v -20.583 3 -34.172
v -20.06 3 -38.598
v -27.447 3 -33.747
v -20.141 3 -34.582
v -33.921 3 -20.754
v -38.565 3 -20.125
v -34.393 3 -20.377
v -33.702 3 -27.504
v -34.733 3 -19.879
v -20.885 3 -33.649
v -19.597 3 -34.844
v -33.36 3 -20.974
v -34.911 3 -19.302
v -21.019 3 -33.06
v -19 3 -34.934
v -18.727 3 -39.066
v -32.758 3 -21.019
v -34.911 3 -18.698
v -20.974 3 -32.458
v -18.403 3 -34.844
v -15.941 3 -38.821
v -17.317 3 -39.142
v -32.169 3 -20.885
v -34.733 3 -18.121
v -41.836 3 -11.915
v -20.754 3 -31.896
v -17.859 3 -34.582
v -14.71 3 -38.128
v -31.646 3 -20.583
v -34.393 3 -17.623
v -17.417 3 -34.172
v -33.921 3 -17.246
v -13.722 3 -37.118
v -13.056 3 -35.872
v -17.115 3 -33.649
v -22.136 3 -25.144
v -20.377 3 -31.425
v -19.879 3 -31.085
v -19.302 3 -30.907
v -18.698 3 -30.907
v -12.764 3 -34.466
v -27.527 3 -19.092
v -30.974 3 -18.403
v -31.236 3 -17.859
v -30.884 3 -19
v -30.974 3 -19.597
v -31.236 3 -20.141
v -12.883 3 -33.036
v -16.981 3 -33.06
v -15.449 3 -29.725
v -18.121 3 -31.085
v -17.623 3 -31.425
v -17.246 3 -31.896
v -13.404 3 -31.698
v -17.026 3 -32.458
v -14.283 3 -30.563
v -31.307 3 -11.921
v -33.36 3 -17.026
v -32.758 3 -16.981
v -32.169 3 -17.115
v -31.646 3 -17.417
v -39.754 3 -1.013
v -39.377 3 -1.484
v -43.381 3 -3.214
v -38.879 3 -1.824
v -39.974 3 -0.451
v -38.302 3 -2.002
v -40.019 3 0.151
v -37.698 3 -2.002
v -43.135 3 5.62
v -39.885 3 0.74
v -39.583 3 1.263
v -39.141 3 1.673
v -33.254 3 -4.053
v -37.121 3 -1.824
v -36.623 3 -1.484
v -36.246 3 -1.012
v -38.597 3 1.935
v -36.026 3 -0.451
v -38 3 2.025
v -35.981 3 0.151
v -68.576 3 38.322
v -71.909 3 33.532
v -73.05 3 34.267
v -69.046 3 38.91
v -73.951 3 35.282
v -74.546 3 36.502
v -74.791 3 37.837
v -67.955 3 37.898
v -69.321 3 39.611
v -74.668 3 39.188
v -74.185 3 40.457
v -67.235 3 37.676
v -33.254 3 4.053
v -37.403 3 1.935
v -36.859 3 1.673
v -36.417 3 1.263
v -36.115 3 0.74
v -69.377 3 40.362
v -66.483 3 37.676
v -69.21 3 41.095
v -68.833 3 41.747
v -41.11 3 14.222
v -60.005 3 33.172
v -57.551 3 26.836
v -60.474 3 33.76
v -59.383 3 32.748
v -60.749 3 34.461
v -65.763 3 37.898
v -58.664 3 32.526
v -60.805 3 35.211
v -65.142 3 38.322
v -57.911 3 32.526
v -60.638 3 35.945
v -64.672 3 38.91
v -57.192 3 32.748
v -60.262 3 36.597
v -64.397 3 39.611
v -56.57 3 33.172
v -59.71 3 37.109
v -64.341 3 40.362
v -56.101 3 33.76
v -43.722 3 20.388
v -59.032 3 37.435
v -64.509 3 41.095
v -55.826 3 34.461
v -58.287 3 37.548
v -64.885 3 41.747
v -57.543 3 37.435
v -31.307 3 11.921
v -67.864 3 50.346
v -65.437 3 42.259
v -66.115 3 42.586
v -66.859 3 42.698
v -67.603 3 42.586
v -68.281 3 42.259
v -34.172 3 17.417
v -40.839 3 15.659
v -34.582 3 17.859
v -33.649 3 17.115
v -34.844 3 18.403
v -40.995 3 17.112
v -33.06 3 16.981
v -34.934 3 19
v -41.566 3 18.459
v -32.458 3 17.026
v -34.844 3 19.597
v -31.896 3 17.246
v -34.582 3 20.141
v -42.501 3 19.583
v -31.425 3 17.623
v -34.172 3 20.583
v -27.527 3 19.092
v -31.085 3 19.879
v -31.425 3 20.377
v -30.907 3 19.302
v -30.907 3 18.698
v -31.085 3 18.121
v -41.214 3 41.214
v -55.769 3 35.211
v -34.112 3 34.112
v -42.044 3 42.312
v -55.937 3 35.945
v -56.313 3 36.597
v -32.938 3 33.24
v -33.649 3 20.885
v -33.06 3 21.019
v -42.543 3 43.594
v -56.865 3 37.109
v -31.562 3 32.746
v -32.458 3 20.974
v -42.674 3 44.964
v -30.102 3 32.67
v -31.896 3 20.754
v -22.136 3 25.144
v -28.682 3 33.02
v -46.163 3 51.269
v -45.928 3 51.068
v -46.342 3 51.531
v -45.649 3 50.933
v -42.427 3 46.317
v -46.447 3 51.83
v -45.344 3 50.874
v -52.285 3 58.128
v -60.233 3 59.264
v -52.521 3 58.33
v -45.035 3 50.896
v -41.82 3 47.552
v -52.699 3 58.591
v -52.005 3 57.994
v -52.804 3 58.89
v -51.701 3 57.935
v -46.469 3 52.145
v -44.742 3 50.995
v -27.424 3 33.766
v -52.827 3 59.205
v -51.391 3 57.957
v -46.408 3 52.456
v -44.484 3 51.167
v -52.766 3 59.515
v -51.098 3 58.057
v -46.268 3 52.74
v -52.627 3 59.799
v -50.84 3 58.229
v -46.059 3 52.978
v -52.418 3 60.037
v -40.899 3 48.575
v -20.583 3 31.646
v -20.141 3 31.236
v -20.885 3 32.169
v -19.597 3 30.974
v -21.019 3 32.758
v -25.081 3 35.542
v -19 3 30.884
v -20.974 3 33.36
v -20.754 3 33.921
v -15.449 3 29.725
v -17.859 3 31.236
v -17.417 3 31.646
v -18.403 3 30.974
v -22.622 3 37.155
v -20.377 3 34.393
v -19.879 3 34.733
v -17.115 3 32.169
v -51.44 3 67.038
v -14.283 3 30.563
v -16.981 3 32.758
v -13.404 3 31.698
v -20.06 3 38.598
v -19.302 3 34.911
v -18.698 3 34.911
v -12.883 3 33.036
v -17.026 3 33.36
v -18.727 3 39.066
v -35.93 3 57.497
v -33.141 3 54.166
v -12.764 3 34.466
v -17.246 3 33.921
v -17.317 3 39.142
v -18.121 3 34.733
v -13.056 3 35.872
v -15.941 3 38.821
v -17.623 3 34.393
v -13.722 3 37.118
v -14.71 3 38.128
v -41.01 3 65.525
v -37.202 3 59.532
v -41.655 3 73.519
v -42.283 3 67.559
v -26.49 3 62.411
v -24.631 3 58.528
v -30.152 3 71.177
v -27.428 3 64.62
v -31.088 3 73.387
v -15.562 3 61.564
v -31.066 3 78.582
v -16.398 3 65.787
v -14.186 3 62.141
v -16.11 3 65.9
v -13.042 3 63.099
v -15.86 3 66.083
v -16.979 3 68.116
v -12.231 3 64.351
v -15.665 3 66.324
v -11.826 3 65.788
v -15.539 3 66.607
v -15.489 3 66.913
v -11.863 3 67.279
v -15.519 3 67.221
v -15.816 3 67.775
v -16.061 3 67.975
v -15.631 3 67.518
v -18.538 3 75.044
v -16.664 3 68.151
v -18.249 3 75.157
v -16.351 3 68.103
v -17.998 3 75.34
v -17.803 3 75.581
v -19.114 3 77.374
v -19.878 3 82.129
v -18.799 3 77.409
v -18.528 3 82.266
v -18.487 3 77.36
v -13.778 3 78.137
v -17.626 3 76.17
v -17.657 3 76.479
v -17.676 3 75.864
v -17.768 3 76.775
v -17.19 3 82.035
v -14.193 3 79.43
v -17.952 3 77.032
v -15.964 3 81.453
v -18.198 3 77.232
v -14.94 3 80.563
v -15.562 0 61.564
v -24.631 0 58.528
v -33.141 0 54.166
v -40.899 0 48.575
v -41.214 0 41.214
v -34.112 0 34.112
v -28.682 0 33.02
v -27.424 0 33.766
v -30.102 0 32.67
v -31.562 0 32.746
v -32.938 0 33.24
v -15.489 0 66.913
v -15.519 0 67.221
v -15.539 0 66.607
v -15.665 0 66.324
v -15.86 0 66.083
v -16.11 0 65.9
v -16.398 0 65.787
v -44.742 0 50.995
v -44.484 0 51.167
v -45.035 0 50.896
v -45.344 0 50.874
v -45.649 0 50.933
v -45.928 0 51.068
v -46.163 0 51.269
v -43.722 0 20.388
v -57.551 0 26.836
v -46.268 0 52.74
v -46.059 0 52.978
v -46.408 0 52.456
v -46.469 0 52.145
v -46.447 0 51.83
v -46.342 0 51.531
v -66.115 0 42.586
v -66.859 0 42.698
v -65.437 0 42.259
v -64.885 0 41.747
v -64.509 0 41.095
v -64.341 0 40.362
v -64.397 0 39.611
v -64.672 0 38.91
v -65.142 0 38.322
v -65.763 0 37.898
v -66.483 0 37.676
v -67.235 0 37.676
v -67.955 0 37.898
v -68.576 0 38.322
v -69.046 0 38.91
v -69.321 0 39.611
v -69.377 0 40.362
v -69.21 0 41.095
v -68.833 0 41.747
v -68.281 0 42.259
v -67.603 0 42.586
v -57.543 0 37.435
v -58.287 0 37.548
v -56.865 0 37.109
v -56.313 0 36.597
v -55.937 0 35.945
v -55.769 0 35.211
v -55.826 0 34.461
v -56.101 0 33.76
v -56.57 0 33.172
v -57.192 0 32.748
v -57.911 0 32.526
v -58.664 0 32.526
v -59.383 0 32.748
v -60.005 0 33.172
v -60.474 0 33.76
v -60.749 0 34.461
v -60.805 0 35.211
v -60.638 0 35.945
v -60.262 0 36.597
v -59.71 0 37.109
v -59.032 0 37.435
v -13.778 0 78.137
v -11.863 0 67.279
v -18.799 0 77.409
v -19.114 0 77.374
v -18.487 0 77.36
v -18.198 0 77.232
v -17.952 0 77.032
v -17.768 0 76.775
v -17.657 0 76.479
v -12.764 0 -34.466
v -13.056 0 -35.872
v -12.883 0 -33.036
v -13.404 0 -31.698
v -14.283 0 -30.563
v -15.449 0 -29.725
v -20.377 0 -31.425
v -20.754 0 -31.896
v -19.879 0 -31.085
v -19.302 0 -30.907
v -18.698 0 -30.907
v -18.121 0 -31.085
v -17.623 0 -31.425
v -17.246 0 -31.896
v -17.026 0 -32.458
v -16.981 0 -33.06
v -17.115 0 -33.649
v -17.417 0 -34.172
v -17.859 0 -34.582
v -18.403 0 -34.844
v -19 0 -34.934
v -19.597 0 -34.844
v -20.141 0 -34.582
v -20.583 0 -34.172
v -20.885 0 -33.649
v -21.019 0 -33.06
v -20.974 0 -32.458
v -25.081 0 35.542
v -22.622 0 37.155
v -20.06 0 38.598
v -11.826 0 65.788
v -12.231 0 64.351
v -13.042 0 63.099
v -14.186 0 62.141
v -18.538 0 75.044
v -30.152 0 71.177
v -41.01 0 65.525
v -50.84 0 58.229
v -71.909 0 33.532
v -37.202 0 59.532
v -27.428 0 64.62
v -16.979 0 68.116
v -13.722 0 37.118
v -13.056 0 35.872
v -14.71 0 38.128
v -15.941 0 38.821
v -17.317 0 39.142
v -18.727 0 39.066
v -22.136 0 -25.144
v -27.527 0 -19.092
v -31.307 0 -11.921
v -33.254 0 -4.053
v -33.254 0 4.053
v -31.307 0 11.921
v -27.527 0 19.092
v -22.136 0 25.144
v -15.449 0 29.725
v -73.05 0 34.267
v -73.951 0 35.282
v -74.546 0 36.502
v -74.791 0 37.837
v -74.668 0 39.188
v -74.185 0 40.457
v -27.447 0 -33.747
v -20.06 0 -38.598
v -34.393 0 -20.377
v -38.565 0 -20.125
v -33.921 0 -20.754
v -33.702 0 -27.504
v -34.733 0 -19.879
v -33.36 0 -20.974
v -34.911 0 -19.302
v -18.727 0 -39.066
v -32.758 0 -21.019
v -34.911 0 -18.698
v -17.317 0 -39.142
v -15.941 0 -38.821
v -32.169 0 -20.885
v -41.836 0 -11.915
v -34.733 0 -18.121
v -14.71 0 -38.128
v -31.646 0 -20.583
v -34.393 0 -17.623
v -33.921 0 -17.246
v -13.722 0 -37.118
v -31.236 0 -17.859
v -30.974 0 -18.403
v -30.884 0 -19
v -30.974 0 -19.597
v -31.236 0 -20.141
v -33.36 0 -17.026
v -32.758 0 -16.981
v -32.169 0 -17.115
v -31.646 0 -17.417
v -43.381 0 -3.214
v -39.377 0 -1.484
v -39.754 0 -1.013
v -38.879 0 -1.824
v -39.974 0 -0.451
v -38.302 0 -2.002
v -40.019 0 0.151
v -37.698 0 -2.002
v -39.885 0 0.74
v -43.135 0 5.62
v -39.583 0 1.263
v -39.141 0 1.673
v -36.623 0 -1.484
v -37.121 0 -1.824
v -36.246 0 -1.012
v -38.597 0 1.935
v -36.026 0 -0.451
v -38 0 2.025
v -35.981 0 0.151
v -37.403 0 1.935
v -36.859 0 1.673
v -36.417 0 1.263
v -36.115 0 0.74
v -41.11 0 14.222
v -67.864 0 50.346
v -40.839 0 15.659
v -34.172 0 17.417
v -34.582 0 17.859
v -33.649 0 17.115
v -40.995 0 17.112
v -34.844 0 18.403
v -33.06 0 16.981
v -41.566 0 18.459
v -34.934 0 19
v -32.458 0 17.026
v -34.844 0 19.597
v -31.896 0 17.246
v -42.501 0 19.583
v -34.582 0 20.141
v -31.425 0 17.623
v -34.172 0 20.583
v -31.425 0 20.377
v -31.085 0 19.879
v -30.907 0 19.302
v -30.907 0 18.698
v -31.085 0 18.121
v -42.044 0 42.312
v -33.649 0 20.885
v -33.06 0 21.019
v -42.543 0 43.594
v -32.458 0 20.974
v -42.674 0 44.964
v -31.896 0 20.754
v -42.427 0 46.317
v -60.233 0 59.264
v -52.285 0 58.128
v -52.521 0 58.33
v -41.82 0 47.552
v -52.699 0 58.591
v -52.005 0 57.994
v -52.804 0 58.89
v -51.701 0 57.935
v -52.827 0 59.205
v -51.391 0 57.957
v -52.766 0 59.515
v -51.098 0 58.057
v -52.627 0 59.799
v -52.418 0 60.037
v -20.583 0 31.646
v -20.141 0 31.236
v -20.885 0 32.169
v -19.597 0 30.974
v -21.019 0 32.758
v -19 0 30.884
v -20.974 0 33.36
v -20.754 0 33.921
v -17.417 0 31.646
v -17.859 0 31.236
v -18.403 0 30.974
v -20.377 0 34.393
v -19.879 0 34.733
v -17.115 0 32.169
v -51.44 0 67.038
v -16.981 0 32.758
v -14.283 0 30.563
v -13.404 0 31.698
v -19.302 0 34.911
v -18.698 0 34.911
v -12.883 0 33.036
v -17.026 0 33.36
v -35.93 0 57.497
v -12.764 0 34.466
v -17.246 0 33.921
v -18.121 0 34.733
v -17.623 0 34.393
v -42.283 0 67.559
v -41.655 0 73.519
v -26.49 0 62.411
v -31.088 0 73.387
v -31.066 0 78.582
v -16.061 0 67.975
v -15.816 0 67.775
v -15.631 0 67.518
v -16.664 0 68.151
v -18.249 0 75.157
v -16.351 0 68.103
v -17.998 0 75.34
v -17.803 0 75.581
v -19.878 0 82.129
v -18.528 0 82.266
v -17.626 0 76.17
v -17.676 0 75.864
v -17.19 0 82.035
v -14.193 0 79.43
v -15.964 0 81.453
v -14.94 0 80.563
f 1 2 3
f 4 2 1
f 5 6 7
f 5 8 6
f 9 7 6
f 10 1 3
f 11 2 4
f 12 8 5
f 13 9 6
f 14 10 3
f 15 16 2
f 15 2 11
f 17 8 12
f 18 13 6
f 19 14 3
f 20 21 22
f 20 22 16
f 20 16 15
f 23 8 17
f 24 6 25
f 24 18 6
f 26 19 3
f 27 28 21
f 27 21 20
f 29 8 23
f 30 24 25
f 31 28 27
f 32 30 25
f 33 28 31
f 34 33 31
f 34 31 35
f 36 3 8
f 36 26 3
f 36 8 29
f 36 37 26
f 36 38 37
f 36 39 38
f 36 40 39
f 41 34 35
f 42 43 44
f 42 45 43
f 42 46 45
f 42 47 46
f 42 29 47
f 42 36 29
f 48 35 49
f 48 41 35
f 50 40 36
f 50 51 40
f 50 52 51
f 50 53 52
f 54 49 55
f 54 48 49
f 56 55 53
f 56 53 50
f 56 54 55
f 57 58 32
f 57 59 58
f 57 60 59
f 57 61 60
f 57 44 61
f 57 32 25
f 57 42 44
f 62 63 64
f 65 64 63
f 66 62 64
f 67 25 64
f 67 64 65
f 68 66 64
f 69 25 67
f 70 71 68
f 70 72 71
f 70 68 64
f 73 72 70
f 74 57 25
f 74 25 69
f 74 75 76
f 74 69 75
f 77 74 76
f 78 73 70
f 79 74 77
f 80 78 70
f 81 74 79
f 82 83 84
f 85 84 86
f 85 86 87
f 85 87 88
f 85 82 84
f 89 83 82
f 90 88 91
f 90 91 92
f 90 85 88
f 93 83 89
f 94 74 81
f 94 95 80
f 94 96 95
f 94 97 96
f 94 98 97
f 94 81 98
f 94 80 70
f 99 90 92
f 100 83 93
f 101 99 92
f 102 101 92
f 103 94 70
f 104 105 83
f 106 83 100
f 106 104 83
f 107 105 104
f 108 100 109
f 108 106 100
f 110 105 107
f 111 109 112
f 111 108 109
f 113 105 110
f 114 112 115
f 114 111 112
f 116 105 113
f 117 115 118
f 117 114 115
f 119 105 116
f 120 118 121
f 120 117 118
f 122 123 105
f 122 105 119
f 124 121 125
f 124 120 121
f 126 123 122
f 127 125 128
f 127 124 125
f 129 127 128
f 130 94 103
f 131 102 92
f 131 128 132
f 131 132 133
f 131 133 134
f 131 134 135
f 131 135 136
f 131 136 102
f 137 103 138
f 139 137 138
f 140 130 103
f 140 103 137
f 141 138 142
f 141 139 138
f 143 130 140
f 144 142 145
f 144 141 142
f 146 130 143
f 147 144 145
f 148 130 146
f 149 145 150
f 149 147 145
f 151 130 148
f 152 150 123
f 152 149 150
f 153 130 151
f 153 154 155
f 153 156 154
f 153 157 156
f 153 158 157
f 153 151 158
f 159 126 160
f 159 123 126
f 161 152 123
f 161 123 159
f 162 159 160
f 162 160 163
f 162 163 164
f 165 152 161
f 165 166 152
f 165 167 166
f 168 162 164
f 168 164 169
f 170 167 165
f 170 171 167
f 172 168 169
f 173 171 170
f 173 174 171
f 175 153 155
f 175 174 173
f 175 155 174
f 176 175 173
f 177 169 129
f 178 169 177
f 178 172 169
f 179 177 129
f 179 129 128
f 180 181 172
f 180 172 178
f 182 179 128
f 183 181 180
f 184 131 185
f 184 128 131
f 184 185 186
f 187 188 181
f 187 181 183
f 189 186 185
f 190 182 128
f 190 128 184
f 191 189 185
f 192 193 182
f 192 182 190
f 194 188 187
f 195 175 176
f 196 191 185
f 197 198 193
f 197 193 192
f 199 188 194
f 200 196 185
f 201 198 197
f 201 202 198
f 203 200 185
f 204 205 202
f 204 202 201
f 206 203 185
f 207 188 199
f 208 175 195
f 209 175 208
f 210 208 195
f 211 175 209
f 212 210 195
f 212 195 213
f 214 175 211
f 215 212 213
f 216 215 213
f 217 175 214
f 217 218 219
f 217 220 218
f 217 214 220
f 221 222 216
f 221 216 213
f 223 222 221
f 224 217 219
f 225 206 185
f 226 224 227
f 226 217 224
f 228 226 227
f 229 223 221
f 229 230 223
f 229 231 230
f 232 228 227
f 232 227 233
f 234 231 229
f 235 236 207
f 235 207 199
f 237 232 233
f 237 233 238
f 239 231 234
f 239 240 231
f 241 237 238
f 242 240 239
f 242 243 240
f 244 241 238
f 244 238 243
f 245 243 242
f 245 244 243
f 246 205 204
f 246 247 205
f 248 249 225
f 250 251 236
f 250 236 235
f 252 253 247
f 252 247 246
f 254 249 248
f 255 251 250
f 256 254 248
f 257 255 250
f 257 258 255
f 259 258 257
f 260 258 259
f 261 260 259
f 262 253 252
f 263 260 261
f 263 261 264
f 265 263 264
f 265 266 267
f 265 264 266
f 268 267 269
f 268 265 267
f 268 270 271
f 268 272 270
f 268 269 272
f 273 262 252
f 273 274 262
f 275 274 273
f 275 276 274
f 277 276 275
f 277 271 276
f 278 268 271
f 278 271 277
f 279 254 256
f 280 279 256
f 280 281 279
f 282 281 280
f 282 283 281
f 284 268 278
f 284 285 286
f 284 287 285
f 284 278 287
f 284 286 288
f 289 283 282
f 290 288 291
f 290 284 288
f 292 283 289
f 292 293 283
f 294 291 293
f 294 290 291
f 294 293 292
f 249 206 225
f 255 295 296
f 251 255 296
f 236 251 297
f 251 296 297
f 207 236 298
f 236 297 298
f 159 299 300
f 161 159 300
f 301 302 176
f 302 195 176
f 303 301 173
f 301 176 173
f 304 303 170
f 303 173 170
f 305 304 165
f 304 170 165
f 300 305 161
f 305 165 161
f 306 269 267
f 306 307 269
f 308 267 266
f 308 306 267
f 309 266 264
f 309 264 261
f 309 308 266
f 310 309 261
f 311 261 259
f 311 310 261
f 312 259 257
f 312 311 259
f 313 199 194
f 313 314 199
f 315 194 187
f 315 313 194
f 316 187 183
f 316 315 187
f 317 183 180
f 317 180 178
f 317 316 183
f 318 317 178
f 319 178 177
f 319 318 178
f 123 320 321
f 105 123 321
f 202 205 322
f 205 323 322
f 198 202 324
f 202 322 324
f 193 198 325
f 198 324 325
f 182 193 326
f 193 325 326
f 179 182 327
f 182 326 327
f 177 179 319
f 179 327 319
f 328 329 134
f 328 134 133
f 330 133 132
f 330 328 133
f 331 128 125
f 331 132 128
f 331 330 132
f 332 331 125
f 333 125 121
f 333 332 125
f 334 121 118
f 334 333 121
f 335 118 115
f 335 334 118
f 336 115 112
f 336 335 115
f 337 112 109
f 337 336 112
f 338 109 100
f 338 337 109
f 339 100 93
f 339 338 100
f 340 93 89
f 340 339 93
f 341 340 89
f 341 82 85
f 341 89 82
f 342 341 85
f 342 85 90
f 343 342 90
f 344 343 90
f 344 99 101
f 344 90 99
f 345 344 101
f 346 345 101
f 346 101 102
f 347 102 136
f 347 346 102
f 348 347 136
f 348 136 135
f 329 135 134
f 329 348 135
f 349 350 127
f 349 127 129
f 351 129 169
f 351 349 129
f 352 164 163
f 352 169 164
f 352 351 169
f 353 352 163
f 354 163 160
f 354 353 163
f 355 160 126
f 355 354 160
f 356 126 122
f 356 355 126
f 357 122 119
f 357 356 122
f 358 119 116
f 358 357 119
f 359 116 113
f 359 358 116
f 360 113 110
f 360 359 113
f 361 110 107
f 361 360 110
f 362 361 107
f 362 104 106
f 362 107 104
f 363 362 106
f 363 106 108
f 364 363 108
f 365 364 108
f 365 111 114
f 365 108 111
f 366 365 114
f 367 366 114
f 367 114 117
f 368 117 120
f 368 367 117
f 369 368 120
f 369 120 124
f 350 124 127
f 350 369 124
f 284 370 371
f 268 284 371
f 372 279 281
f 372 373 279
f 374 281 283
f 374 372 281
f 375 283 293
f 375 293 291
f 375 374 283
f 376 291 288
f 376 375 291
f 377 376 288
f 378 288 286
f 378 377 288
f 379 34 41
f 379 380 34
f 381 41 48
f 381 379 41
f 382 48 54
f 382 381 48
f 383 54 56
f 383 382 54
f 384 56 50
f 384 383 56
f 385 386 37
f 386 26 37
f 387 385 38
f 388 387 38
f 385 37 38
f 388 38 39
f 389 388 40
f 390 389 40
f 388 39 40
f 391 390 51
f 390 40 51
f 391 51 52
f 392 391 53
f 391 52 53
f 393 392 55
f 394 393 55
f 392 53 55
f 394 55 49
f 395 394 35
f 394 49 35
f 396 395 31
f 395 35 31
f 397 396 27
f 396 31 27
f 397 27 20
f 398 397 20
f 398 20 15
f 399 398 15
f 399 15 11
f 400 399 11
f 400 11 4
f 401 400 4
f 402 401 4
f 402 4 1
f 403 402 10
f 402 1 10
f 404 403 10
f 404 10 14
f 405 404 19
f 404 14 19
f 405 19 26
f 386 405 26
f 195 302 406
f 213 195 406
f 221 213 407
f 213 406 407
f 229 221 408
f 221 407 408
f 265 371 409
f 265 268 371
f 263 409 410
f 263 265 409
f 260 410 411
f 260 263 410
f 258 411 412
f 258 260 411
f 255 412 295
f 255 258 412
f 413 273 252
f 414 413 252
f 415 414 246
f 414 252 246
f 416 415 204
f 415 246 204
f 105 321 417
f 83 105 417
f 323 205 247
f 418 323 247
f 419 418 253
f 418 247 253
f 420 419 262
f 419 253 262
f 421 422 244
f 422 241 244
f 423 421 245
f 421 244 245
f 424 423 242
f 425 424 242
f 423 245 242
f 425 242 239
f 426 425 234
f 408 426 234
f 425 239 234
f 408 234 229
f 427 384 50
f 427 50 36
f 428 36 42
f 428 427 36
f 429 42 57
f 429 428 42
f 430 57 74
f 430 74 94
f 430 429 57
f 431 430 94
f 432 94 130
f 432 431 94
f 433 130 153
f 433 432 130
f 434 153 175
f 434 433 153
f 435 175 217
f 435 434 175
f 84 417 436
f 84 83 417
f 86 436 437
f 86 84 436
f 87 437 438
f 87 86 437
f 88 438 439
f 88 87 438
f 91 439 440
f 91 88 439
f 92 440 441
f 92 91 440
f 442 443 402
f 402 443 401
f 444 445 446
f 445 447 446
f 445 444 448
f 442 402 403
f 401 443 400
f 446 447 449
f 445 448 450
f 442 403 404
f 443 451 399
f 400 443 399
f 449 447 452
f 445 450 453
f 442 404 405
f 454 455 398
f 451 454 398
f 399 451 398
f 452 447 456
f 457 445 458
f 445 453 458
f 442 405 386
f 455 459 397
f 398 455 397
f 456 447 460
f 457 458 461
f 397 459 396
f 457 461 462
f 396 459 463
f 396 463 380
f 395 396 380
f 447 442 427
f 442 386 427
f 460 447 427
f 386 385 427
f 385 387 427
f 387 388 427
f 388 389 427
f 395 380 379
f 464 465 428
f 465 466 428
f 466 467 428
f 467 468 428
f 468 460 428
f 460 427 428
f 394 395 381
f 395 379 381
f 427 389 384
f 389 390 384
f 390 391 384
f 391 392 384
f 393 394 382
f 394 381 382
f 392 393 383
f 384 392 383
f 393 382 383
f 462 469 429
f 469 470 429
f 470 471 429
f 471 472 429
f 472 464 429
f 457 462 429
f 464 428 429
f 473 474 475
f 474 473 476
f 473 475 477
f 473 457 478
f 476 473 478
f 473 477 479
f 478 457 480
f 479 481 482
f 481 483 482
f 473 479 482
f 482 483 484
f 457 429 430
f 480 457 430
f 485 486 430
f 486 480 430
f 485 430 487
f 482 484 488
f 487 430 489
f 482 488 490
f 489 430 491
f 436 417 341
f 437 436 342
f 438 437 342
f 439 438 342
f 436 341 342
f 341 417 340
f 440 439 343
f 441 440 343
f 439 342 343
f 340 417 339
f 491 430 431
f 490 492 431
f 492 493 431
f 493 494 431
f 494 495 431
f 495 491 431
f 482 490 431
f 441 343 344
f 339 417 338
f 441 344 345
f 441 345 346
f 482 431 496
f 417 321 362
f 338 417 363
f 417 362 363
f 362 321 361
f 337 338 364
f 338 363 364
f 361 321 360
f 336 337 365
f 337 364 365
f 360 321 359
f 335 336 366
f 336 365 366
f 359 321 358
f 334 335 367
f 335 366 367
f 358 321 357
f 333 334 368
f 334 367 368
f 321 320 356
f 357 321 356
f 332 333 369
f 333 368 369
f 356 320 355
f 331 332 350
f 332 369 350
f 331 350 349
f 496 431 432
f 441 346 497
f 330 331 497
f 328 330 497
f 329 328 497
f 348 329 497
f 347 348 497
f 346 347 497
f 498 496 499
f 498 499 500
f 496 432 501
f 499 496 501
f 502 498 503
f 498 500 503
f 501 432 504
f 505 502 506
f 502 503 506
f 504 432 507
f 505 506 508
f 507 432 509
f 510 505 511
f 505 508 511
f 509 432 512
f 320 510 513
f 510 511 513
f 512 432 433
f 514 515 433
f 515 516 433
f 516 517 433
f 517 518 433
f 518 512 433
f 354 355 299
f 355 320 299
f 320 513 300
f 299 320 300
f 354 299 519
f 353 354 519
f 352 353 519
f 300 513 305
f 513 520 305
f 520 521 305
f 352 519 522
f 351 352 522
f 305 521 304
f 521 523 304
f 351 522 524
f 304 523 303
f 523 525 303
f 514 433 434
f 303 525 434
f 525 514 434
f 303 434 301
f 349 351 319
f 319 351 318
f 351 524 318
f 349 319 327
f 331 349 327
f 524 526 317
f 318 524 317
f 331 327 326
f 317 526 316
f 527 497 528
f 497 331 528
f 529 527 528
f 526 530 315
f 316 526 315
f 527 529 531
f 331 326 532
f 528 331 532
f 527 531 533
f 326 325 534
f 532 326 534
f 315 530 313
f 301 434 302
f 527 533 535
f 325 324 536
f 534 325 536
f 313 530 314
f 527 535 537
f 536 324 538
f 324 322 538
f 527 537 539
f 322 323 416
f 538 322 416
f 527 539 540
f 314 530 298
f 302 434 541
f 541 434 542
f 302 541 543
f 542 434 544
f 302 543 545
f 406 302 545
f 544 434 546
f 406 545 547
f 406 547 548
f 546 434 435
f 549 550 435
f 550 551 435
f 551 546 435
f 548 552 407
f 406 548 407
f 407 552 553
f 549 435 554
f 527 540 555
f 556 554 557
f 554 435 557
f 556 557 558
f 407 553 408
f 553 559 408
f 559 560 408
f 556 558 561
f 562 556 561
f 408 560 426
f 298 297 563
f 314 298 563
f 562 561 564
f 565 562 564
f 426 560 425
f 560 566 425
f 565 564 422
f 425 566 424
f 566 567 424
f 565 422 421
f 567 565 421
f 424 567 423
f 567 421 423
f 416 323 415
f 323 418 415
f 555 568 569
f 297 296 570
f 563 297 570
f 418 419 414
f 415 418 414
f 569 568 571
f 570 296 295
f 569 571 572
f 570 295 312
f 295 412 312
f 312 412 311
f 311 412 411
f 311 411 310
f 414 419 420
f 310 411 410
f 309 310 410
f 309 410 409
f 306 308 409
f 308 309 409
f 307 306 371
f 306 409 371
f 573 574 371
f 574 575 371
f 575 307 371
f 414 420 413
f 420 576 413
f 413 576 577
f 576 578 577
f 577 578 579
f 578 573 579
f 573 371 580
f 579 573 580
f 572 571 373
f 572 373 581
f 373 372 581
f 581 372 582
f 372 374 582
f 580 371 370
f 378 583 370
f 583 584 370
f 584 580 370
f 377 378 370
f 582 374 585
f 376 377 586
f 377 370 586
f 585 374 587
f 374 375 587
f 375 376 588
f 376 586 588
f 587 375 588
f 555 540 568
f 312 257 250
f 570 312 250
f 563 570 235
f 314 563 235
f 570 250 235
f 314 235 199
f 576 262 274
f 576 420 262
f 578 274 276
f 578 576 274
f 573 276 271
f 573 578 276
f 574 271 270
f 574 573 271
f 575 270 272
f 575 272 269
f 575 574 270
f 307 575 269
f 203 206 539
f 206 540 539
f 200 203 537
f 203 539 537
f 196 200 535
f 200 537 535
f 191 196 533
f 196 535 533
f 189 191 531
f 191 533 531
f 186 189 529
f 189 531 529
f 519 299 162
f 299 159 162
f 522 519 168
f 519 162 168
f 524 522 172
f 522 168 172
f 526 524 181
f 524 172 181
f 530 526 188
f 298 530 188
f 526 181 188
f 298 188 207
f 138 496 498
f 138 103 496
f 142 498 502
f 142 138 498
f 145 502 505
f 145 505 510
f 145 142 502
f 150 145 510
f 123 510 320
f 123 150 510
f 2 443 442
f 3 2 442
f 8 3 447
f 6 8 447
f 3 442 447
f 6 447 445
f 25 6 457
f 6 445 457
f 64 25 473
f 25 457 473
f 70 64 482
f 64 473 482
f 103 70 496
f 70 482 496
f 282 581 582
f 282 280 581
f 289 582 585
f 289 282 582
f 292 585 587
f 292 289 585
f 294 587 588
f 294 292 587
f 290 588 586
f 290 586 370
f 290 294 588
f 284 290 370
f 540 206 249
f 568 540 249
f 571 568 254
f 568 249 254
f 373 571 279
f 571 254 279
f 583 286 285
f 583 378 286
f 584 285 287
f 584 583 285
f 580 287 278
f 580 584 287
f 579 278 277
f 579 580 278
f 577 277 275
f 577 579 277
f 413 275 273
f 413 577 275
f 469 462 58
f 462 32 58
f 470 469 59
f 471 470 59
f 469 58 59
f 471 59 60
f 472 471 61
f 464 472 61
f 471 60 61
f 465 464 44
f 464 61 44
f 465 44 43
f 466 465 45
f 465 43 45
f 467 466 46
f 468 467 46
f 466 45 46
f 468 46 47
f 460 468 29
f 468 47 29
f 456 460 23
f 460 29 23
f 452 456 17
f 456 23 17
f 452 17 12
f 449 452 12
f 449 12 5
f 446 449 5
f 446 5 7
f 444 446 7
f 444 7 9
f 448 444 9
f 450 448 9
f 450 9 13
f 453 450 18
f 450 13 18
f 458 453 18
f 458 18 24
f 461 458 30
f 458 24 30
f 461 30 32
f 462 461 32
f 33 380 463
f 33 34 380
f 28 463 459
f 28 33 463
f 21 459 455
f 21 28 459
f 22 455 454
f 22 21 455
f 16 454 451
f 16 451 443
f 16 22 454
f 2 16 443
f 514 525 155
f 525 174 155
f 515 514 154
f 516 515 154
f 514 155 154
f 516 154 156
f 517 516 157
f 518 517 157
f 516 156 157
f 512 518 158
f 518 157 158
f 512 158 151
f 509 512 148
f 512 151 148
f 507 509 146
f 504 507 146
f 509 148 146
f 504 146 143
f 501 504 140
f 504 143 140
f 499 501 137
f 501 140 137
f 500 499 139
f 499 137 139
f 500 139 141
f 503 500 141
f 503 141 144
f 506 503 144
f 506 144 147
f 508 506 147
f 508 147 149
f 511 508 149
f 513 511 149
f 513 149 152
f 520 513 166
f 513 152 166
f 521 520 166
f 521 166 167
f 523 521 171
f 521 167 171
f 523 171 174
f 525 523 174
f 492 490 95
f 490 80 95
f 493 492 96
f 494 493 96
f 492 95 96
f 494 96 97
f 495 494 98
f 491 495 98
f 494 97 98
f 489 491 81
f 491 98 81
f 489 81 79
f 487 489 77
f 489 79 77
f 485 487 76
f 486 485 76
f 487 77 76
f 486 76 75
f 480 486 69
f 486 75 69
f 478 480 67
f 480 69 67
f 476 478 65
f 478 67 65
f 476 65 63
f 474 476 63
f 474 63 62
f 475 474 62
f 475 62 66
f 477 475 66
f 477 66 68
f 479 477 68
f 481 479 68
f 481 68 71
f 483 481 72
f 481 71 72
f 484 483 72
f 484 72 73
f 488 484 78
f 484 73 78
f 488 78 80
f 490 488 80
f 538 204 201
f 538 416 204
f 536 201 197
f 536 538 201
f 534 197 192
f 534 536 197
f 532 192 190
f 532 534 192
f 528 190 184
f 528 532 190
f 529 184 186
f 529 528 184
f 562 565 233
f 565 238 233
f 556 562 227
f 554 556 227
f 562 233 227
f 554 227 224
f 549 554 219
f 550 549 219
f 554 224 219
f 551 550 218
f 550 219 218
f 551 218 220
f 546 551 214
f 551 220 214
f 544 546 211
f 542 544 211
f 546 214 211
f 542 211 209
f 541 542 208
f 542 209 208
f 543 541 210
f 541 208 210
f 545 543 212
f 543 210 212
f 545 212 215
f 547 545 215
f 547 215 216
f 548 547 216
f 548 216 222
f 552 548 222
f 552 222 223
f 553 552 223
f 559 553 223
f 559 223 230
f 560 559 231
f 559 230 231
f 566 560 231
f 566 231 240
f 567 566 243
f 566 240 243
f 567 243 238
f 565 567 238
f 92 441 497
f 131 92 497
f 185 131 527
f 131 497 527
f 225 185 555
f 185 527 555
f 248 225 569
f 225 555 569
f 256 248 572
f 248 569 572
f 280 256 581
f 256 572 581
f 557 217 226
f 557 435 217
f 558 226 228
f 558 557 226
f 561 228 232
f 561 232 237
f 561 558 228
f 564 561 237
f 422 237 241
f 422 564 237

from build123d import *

# Parameters (mm, degrees)
SKETCH1_R               = 43.5
SKETCH1_R_2             = 33.5
BOSS_EXTRUDE1_DEPTH     = 3
SKETCH3_R               = 2.025
CUT_EXTRUDE2_DEPTH      = 62.591395503
CIRPATTERN1_COUNT       = 12
CUT_EXTRUDE1_DEPTH      = 62.591395503
BOSS_EXTRUDE2_DEPTH     = 3
CUT_EXTRUDE_THIN1_DEPTH = 3
FILLET1_R               = 1.2
FILLET2_R               = 5
CUT_EXTRUDE3_DEPTH      = 112.227677485
CUT_EXTRUDE3_DEPTH_BACK = 112.227677485
SKETCH6_R               = 2.525


with BuildPart() as part:
    # Sketch1 → Boss-Extrude1 (new body)
    with BuildSketch(Plane(origin=(0, 0, 0), x_dir=(1, 0, 0), z_dir=(0, 1, 0))):
        with Locations(Location((0, 0, 0), (0, 0, 270))):
            Circle(SKETCH1_R)
        with Locations(Location((0, 0, 0), (0, 0, 270))):
            Circle(SKETCH1_R_2, mode=Mode.SUBTRACT)
    extrude(amount=BOSS_EXTRUDE1_DEPTH)

    # Sketch3 → Cut-Extrude2 (cut, symmetric)
    with BuildSketch(Plane(origin=(0, 3, 0), x_dir=(1, 0, 0), z_dir=(0, 1, 0))):
        with Locations(Location((-38, 0, 0), (0, 0, 270))):
            Circle(SKETCH3_R)
    cut_extrude2 = extrude(amount=CUT_EXTRUDE2_DEPTH, both=True, mode=Mode.SUBTRACT)

    # CirPattern1: Cut-Extrude2 ×12 about axis
    cirpattern1_axis = Axis((0, 0, 0), (0, 1, 0))
    for i in range(1, CIRPATTERN1_COUNT):
        add(cut_extrude2.rotate(cirpattern1_axis, i * 360 / CIRPATTERN1_COUNT), mode=Mode.SUBTRACT)

    # Sketch2 → Cut-Extrude1 (cut, symmetric)
    with BuildSketch(Plane(origin=(0, 3, 0), x_dir=(1, 0, 0), z_dir=(0, 1, 0))):
        with BuildLine():
            Line((0, 0), (43.5, 0))
            ThreePointArc((43.5, 0), (24.950574981, -35.633113927), (-14.877876235, -40.876629004))
            Line((-14.877876235, -40.876629004), (0, 0))
        make_face()
    cut_extrude1 = extrude(amount=CUT_EXTRUDE1_DEPTH, both=True, mode=Mode.SUBTRACT)

    # Mirror1: Cut-Extrude1 across plane
    add(cut_extrude1.mirror(Plane.XY), mode=Mode.SUBTRACT)

    # Sketch4 → Boss-Extrude2 (add)
    with BuildSketch(Plane(origin=(0, 0, 0), x_dir=(1, 0, 0), z_dir=(0, 1, 0))):
        with BuildLine():
            ThreePointArc((-30.759144982, -30.759144982), (-35.633113927, -24.950574981), (-39.424388736, -18.383894386))
            Line((-39.424388736, -18.383894386), (-57.550544477, -26.836259621))
            Line((-57.550544477, -26.836259621), (-76.583008005, -35.711243117))
            ThreePointArc((-76.583008005, -35.711243117), (-51.440340751, -67.038357255), (-14.673271013, -83.21625513))
            Line((-14.673271013, -83.21625513), (-11.026659282, -62.535292316))
            ThreePointArc((-11.026659282, -62.535292316), (-29.32103694, -56.325187907), (-44.901280605, -44.901280605))
            Line((-44.901280605, -44.901280605), (-30.759144982, -30.759144982))
        make_face()
    extrude(amount=BOSS_EXTRUDE2_DEPTH)

    # Sketch5 → Cut-Extrude-Thin1 (cut)
    with BuildSketch(Plane(origin=(0, 3, 0), x_dir=(1, 0, 0), z_dir=(0, 1, 0))):
        with BuildLine():
            ThreePointArc((-46.972968566, -52.168766749), (-32.414752649, -62.268160489), (-15.791564015, -68.400778548))
            Line((-15.791564015, -68.400778548), (-15.251681485, -66.062290392))
            ThreePointArc((-15.251681485, -66.062290392), (-31.306555977, -60.139334489), (-45.367055111, -50.385219167))
            Line((-45.367055111, -50.385219167), (-46.972968566, -52.168766749))
        make_face()
        with BuildLine():
            ThreePointArc((-53.329709327, -59.228642591), (-36.801364475, -70.694763404), (-17.928599031, -77.657294163))
            Line((-17.928599031, -77.657294163), (-17.388716501, -75.318806008))
            ThreePointArc((-17.388716501, -75.318806008), (-35.693167803, -68.565937405), (-51.723795872, -57.445095009))
            Line((-51.723795872, -57.445095009), (-53.329709327, -59.228642591))
        make_face()
    extrude(amount=-CUT_EXTRUDE_THIN1_DEPTH, mode=Mode.SUBTRACT)

    # Fillet1
    fillet1_edges = [part.edges().sort_by_distance(p)[0] for p in [
        (-46.972968566, 1.5, 52.168766749),
        (-53.329709327, 1.5, 59.228642591),
        (-45.367055111, 1.5, 50.385219167),
        (-51.723795872, 1.5, 57.445095009),
        (-15.251681485, 1.5, 66.062290392),
        (-17.388716501, 1.5, 75.318806008),
        (-15.791564015, 1.5, 68.400778548),
        (-17.928599031, 1.5, 77.657294163),
    ]]
    fillet(fillet1_edges, radius=FILLET1_R - 0.0001)  # a hair under: the kernel refuses the full size

    # Fillet2
    fillet2_edges = [part.edges().sort_by_distance(p)[0] for p in [
        (-14.877876235, 1.5, -40.876629004),
        (-11.457674801, 1.5, -31.479702796),
        (-11.457674801, 1.5, 31.479702796),
        (-14.877876235, 1.5, 40.876629004),
        (-39.424388736, 1.5, 18.383894386),
        (-76.583008005, 1.5, 35.711243117),
        (-14.673271013, 1.5, 83.21625513),
        (-11.026659282, 1.5, 62.535292316),
        (-30.759144982, 1.5, 30.759144982),
        (-44.901280605, 1.5, 44.901280605),
    ]]
    fillet(fillet2_edges, radius=FILLET2_R - 0.0001)  # a hair under: the kernel refuses the full size

    # Sketch6 → Cut-Extrude3 (cut, two sides: drawn at the far end of the back side and taken through both)
    with BuildSketch(Plane(origin=(0, 3, 0), x_dir=(1, 0, 0), z_dir=(0, 1, 0)).offset(-CUT_EXTRUDE3_DEPTH_BACK)):
        with Locations(Location((-58.287376448, -35.022589094, 0), (0, 0, 270))):
            Circle(SKETCH6_R)
        with Locations(Location((-66.859049455, -40.172969843, 0), (0, 0, 270))):
            Circle(SKETCH6_R)
    extrude(amount=CUT_EXTRUDE3_DEPTH + CUT_EXTRUDE3_DEPTH_BACK, mode=Mode.SUBTRACT)


solid = part.part
